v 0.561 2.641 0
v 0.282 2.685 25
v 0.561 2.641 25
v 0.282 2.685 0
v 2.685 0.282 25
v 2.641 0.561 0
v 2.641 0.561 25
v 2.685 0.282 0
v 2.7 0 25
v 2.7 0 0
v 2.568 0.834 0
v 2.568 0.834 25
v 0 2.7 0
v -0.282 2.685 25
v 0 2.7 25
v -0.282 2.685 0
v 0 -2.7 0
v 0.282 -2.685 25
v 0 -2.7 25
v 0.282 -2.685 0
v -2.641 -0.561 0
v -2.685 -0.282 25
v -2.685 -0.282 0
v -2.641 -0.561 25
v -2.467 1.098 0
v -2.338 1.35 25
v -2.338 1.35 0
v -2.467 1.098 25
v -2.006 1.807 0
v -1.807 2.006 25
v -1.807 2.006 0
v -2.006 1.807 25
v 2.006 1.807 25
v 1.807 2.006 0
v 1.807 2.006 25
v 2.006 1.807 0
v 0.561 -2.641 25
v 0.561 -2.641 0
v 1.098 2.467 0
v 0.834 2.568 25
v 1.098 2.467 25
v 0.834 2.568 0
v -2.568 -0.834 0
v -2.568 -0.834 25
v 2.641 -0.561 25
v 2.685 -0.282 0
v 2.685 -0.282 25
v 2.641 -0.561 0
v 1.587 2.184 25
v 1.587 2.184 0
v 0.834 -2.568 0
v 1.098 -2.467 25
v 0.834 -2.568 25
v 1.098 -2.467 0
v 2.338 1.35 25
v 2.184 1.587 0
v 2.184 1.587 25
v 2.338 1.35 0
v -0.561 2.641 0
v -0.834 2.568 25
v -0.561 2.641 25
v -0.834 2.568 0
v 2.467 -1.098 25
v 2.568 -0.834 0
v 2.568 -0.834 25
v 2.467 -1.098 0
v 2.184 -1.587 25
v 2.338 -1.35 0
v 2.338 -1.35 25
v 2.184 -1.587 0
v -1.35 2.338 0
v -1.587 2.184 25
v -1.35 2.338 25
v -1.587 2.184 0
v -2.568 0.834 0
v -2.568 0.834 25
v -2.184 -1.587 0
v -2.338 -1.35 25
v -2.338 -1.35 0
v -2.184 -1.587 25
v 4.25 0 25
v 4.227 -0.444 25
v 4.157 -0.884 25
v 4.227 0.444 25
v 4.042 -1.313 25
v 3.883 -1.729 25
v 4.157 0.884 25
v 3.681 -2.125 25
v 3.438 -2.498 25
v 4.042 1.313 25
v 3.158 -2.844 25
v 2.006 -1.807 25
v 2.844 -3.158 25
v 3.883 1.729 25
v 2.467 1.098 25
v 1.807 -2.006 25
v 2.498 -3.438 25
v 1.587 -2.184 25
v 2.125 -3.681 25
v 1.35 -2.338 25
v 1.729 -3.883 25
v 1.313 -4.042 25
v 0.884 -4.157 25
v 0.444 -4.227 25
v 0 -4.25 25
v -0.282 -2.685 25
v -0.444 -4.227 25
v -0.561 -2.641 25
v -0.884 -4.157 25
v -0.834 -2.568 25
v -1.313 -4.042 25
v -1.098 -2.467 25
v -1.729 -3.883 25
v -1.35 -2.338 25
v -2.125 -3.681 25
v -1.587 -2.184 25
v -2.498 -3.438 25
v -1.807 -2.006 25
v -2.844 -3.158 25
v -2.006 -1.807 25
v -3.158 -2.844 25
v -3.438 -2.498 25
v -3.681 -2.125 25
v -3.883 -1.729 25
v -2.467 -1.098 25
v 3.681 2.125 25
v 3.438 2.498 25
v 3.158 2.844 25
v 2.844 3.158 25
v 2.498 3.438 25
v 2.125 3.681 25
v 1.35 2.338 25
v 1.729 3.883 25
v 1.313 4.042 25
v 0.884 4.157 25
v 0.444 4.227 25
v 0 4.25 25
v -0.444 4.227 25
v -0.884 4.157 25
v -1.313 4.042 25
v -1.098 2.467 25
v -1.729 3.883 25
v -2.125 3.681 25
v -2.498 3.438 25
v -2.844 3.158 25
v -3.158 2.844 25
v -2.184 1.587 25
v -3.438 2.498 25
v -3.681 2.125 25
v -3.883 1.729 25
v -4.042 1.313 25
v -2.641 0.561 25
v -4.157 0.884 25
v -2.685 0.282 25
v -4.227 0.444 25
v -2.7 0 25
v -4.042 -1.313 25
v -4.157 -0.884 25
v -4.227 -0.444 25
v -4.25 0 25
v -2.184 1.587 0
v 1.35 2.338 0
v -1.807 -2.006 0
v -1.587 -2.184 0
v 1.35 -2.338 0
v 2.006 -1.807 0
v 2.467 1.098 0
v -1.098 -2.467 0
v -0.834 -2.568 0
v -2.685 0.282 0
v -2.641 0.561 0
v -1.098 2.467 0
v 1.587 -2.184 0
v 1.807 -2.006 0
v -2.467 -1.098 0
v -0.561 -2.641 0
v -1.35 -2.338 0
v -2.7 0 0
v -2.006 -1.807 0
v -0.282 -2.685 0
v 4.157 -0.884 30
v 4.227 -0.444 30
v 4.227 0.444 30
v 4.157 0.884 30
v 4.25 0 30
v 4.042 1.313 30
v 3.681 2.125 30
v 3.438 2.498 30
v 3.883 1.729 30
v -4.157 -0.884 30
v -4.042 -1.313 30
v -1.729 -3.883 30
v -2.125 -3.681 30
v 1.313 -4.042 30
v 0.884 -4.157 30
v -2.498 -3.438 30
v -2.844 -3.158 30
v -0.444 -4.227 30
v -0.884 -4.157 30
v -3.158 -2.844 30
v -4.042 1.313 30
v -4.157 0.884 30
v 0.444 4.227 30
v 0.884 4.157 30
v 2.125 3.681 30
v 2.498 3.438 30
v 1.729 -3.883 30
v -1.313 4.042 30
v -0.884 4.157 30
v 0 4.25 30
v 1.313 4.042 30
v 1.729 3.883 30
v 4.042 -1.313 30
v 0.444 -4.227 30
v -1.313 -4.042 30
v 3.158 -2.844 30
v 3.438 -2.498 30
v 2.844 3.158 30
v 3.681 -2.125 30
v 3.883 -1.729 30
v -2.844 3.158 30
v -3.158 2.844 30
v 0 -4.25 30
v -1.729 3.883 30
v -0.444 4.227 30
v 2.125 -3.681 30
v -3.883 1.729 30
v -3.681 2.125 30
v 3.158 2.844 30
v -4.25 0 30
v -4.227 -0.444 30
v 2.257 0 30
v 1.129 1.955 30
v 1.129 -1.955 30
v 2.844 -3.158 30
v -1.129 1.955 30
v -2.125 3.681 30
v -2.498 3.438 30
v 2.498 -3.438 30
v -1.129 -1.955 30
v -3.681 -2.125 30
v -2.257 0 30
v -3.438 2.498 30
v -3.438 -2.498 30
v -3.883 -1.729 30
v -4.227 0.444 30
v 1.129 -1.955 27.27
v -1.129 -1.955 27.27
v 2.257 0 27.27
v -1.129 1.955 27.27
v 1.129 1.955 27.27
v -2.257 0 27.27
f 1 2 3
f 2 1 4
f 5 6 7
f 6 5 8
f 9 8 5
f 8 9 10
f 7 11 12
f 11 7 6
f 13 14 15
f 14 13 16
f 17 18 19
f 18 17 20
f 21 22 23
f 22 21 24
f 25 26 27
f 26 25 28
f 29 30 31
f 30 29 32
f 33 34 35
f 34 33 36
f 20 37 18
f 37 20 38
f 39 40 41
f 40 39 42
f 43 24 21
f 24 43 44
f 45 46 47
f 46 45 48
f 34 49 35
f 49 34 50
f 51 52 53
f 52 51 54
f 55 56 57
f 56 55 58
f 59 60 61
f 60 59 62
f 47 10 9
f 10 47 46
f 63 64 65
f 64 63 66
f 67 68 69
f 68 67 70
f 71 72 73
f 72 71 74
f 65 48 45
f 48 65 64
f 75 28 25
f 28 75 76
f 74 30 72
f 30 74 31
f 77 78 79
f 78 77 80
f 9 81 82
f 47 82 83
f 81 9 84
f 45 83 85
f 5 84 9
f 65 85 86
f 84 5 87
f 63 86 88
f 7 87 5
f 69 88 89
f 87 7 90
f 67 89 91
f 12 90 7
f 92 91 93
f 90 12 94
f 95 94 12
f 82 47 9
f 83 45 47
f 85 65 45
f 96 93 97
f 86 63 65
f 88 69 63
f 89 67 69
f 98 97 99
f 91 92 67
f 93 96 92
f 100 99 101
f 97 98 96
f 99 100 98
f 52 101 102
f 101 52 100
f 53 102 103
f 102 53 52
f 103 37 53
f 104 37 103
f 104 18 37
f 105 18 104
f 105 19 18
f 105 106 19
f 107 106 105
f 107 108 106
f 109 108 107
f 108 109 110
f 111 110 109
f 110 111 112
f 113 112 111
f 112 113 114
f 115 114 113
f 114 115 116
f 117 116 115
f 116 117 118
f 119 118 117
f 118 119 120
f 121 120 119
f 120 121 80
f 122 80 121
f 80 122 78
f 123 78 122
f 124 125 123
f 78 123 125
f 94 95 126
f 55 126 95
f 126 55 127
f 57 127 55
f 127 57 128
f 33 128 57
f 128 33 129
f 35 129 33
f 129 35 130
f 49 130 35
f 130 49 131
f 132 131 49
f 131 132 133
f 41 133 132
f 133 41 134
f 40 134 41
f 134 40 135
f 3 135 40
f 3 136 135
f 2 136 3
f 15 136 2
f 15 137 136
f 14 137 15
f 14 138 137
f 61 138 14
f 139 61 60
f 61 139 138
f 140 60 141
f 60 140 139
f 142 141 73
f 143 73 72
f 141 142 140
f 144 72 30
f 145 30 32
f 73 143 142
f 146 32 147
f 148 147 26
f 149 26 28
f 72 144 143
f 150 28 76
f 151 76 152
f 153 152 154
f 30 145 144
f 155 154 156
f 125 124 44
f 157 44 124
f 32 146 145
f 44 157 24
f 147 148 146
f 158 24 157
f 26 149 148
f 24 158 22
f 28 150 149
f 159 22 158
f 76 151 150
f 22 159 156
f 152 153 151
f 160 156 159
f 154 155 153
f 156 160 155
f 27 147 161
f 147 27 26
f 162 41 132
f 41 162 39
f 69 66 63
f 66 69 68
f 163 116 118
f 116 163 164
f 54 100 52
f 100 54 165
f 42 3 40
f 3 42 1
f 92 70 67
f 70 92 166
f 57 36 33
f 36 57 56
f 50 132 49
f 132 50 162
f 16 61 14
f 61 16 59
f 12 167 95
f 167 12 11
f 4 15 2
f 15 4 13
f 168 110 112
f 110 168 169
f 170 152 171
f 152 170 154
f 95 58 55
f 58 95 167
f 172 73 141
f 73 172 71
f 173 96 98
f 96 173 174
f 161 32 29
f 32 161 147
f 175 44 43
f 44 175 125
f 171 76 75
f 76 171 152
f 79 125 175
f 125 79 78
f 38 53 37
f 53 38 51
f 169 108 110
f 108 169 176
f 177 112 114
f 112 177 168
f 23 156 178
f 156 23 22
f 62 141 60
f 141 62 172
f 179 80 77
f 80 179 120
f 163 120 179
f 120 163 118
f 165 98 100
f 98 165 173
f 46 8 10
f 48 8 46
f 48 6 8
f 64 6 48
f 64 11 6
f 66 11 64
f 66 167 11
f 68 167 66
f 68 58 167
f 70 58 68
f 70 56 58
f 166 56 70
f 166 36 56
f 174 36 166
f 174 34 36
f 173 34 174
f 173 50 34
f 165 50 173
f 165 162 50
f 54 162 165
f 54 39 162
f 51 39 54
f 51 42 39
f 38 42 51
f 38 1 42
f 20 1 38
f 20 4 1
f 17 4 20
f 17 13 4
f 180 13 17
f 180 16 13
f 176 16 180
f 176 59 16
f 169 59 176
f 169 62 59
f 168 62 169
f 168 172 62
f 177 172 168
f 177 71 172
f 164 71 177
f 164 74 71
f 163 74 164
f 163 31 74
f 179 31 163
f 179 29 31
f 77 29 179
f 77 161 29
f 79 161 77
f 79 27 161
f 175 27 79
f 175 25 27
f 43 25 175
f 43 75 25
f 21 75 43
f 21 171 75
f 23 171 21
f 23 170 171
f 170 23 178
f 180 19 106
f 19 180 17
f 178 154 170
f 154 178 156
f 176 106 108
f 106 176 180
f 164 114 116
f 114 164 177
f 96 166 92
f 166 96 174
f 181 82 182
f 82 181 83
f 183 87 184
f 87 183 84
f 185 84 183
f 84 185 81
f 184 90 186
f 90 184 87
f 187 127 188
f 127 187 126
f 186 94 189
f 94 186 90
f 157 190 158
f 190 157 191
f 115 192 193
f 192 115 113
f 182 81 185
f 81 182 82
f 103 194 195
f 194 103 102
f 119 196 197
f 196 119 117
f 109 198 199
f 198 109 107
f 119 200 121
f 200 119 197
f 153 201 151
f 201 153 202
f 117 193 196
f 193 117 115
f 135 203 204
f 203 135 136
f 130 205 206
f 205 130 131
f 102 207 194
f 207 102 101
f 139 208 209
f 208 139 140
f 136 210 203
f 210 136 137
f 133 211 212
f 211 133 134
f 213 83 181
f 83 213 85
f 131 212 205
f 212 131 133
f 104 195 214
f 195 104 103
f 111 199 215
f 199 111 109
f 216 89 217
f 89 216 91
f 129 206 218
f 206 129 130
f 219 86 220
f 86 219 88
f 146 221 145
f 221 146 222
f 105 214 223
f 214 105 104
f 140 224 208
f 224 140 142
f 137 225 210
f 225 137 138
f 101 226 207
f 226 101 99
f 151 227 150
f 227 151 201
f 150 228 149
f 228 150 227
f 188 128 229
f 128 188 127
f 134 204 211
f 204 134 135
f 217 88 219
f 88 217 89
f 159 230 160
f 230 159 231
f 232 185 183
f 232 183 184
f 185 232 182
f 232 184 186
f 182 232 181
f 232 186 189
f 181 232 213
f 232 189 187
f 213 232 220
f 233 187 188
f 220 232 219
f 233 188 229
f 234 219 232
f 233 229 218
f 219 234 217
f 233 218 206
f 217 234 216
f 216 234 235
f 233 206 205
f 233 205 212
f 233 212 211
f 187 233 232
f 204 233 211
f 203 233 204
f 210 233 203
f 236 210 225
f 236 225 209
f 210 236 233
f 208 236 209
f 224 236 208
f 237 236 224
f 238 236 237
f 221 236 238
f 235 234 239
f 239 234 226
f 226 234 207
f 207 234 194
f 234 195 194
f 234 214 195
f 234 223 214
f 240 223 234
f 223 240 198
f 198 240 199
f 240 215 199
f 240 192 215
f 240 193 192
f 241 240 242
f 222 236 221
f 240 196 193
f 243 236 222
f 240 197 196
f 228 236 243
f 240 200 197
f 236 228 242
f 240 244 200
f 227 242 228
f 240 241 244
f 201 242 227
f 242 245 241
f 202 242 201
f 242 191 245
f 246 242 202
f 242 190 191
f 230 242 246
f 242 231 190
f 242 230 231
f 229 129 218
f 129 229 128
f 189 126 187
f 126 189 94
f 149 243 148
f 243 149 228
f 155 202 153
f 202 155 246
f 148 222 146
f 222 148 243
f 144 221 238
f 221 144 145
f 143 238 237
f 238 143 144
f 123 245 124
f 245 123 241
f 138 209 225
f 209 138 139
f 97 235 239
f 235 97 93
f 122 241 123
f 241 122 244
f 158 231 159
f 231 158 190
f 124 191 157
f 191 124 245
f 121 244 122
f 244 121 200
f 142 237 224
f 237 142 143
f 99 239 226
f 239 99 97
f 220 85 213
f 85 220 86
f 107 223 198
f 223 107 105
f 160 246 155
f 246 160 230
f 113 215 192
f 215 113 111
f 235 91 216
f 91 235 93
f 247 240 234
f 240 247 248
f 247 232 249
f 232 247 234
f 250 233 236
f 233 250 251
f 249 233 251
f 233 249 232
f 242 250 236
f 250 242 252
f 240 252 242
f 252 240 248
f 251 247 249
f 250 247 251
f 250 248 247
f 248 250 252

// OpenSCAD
// Socket-head cap screw, smooth printable representation.
$fn = 60;
eps = 0.02;
shaft_d = 5.4;
head_d = 8.5;
head_h = 5;
shaft_l = 25;
socket_flat = head_d * 0.46;
socket_depth = head_h * 0.55;
difference() {
    union() {
        cylinder(d = shaft_d, h = shaft_l);
        translate([0, 0, shaft_l]) cylinder(d = head_d, h = head_h);
    }
    translate([0, 0, shaft_l + head_h - socket_depth + eps])
        cylinder(d = socket_flat / cos(30), h = socket_depth + eps, $fn = 6);
}
